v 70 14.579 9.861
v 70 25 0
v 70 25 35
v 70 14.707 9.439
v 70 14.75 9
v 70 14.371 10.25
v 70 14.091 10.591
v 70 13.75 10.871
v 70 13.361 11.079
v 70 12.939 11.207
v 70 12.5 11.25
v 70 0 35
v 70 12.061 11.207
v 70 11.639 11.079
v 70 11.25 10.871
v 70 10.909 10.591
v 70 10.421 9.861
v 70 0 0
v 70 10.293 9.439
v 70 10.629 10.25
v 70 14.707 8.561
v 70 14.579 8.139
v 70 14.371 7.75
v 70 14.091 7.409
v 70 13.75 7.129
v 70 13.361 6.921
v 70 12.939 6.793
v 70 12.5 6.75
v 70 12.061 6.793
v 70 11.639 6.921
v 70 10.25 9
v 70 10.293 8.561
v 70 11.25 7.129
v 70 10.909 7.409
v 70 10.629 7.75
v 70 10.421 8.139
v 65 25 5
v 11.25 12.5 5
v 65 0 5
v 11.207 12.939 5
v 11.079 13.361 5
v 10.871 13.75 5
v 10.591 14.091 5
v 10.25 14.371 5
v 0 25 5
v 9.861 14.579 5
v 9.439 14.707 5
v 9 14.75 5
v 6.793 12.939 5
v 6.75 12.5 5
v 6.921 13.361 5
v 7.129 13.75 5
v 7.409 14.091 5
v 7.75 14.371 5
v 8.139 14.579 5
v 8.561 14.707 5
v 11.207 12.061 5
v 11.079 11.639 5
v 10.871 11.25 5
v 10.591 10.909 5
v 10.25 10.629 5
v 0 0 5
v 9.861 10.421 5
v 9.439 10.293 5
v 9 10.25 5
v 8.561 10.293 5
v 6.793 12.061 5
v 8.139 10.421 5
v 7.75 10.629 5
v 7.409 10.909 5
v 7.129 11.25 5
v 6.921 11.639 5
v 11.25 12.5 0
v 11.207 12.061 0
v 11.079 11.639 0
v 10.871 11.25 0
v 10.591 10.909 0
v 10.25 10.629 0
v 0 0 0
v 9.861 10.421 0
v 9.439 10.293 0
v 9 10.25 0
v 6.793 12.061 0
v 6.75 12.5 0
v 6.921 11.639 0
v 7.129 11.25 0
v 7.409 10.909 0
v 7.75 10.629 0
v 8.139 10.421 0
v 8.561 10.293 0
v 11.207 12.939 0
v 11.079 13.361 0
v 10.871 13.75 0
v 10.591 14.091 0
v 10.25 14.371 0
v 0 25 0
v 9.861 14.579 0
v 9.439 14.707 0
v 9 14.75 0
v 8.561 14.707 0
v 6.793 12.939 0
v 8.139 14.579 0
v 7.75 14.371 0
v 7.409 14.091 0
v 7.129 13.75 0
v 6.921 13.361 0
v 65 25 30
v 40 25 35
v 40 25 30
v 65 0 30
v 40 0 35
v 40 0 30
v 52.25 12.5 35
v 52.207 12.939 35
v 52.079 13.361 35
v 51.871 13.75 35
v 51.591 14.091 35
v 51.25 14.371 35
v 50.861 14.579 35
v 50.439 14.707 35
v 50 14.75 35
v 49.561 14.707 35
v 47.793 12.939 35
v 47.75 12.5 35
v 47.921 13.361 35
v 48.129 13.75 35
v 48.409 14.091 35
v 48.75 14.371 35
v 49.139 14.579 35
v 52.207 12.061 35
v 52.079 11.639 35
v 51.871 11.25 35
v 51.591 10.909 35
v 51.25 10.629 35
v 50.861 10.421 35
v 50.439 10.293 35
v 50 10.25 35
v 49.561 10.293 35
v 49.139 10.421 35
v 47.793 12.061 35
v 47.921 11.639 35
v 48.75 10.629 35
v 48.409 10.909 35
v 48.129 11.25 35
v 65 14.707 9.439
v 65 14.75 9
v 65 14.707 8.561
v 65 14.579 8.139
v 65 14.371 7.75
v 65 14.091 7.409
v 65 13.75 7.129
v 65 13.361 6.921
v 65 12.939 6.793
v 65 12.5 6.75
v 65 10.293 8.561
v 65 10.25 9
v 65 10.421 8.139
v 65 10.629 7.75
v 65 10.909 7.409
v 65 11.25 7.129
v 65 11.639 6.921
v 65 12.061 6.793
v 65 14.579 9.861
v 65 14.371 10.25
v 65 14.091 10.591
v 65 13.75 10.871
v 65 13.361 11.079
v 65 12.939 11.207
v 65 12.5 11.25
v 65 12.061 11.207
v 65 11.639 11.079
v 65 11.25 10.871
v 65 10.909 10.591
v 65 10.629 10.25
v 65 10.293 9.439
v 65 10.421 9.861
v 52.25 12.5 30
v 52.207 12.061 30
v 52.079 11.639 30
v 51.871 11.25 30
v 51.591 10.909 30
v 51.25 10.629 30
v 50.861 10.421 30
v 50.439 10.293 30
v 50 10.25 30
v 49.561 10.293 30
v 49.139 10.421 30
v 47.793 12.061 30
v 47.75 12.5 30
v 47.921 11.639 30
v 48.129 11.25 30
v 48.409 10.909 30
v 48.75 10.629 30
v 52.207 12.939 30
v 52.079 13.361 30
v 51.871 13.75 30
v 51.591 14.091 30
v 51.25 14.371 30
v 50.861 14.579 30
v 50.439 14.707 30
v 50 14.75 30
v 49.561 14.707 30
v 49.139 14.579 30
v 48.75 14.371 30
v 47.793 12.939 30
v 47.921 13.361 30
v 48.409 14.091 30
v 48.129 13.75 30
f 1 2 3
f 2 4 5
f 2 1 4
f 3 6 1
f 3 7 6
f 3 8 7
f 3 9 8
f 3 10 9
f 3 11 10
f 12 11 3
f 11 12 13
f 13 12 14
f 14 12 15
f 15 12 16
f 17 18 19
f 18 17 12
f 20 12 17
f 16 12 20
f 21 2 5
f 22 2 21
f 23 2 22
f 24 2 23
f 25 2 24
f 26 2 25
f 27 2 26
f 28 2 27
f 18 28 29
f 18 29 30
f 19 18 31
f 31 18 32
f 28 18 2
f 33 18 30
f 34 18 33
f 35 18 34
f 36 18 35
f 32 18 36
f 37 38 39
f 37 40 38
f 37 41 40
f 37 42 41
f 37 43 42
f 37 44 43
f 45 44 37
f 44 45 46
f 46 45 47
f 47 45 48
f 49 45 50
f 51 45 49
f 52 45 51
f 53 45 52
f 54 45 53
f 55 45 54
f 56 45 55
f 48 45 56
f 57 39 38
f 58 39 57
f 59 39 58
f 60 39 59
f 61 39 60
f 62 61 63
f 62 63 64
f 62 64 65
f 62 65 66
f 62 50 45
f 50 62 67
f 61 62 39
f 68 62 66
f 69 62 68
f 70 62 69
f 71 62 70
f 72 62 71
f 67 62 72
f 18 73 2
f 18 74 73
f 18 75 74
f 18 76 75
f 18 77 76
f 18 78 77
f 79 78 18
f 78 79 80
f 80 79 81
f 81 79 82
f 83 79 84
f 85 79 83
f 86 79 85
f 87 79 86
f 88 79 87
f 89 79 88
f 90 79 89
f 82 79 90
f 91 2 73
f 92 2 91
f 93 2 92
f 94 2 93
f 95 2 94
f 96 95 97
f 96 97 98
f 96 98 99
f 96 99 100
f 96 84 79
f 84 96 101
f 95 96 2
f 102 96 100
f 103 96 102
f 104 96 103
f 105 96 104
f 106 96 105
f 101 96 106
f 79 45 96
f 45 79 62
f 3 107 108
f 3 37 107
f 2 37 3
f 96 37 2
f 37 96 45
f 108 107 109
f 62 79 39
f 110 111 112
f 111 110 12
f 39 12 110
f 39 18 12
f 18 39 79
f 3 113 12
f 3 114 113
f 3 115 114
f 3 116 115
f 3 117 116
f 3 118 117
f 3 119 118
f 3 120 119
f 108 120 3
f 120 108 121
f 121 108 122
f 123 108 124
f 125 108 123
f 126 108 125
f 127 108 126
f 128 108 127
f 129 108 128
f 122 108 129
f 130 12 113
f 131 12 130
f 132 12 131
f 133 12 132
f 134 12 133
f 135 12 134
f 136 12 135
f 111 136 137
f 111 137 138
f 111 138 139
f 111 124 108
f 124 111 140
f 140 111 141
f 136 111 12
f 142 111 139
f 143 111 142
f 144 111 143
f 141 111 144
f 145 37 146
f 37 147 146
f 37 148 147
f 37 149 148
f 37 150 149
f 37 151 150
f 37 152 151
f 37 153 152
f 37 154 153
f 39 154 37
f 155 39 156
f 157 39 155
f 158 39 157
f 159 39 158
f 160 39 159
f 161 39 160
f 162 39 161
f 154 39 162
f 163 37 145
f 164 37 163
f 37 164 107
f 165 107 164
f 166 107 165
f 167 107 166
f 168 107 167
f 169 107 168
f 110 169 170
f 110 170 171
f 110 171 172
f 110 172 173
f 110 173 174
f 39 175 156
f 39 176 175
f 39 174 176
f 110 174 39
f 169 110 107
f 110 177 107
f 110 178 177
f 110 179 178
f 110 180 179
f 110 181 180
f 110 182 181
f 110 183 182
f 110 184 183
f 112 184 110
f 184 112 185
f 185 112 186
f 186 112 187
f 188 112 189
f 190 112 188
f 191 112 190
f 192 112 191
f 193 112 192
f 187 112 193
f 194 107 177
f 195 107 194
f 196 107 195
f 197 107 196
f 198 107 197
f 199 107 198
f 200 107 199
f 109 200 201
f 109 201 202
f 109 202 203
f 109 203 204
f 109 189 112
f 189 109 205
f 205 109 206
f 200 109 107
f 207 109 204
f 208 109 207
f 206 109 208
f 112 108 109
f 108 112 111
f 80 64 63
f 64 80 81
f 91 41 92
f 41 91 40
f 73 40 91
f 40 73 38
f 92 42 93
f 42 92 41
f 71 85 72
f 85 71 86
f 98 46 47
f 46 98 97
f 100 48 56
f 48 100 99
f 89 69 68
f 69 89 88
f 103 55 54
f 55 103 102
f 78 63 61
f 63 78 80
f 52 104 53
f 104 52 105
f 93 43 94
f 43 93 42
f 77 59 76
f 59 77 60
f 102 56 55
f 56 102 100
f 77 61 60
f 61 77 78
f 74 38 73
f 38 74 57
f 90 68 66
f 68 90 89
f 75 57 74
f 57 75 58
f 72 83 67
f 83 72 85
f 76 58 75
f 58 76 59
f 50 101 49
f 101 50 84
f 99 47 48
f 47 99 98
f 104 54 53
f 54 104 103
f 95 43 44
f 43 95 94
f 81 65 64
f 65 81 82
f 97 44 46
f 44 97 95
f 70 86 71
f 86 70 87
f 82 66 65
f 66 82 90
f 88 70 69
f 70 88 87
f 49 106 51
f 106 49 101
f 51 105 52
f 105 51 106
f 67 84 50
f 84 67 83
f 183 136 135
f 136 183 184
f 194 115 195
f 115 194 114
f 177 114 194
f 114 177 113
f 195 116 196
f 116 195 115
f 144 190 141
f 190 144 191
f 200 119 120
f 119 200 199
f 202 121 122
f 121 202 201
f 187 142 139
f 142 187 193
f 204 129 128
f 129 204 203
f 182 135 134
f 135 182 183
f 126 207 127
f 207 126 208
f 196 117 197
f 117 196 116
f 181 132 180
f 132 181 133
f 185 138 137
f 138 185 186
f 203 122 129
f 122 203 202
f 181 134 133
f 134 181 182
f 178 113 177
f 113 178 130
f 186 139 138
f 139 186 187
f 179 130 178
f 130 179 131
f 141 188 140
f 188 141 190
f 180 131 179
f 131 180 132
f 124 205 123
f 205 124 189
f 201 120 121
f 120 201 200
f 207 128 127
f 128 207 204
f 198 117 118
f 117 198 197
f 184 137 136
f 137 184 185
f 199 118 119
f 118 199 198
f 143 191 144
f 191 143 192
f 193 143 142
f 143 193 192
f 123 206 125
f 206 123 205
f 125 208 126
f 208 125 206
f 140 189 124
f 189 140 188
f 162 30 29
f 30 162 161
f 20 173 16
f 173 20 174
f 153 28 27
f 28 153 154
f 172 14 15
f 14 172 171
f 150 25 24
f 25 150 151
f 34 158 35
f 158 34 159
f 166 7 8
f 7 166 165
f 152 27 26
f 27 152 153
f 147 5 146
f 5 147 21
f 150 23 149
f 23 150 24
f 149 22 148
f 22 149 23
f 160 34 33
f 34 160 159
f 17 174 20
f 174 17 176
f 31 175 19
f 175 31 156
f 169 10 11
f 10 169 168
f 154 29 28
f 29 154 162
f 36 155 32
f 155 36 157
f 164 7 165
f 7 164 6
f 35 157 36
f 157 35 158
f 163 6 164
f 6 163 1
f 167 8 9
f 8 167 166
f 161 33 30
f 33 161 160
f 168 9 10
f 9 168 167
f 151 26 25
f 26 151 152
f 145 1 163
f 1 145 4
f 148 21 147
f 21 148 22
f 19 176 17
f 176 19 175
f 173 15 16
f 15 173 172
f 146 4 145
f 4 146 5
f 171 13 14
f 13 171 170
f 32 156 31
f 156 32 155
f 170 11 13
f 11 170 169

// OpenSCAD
$fn = 32;

// ----------------------------------------------------------------------
// Z-bracket: 70 x 25 x 35 mm
// ----------------------------------------------------------------------

// --- parameters (mm) ---
bottom_run = 70;          // lower foot length, X
top_run = 25;             // upper foot length, X
profile_w = 25;           // bracket width, Y
height = 35;              // overall rise, Z
mat_t = 5;                // plate thickness
hole_d = 4.5;             // clearance for M4

module hole_z(px, py, z0) {
  translate([px, py, z0 - 0.5]) cylinder(h = mat_t + 1, d = hole_d);
}
module hole_x(py, pz) {
  translate([-0.5, py, pz]) rotate([0, 90, 0]) cylinder(h = mat_t + 1, d = hole_d);
}

difference() {
  union() {
    cube([bottom_run, profile_w, mat_t]);
    /* web, overlapping the lower foot */
    translate([bottom_run - mat_t, 0, 0]) cube([mat_t, profile_w, height]);
    /* upper foot, sunk into the web */
    translate([bottom_run - mat_t - top_run, 0, height - mat_t]) cube([top_run + mat_t, profile_w, mat_t]);
  }
  hole_z(9, 12.5, 0);
  translate([bottom_run - mat_t - 15, 0, 0]) hole_z(0, 12.5, height - mat_t);
  translate([bottom_run - mat_t, 0, 0]) hole_x(12.5, 9);
}
